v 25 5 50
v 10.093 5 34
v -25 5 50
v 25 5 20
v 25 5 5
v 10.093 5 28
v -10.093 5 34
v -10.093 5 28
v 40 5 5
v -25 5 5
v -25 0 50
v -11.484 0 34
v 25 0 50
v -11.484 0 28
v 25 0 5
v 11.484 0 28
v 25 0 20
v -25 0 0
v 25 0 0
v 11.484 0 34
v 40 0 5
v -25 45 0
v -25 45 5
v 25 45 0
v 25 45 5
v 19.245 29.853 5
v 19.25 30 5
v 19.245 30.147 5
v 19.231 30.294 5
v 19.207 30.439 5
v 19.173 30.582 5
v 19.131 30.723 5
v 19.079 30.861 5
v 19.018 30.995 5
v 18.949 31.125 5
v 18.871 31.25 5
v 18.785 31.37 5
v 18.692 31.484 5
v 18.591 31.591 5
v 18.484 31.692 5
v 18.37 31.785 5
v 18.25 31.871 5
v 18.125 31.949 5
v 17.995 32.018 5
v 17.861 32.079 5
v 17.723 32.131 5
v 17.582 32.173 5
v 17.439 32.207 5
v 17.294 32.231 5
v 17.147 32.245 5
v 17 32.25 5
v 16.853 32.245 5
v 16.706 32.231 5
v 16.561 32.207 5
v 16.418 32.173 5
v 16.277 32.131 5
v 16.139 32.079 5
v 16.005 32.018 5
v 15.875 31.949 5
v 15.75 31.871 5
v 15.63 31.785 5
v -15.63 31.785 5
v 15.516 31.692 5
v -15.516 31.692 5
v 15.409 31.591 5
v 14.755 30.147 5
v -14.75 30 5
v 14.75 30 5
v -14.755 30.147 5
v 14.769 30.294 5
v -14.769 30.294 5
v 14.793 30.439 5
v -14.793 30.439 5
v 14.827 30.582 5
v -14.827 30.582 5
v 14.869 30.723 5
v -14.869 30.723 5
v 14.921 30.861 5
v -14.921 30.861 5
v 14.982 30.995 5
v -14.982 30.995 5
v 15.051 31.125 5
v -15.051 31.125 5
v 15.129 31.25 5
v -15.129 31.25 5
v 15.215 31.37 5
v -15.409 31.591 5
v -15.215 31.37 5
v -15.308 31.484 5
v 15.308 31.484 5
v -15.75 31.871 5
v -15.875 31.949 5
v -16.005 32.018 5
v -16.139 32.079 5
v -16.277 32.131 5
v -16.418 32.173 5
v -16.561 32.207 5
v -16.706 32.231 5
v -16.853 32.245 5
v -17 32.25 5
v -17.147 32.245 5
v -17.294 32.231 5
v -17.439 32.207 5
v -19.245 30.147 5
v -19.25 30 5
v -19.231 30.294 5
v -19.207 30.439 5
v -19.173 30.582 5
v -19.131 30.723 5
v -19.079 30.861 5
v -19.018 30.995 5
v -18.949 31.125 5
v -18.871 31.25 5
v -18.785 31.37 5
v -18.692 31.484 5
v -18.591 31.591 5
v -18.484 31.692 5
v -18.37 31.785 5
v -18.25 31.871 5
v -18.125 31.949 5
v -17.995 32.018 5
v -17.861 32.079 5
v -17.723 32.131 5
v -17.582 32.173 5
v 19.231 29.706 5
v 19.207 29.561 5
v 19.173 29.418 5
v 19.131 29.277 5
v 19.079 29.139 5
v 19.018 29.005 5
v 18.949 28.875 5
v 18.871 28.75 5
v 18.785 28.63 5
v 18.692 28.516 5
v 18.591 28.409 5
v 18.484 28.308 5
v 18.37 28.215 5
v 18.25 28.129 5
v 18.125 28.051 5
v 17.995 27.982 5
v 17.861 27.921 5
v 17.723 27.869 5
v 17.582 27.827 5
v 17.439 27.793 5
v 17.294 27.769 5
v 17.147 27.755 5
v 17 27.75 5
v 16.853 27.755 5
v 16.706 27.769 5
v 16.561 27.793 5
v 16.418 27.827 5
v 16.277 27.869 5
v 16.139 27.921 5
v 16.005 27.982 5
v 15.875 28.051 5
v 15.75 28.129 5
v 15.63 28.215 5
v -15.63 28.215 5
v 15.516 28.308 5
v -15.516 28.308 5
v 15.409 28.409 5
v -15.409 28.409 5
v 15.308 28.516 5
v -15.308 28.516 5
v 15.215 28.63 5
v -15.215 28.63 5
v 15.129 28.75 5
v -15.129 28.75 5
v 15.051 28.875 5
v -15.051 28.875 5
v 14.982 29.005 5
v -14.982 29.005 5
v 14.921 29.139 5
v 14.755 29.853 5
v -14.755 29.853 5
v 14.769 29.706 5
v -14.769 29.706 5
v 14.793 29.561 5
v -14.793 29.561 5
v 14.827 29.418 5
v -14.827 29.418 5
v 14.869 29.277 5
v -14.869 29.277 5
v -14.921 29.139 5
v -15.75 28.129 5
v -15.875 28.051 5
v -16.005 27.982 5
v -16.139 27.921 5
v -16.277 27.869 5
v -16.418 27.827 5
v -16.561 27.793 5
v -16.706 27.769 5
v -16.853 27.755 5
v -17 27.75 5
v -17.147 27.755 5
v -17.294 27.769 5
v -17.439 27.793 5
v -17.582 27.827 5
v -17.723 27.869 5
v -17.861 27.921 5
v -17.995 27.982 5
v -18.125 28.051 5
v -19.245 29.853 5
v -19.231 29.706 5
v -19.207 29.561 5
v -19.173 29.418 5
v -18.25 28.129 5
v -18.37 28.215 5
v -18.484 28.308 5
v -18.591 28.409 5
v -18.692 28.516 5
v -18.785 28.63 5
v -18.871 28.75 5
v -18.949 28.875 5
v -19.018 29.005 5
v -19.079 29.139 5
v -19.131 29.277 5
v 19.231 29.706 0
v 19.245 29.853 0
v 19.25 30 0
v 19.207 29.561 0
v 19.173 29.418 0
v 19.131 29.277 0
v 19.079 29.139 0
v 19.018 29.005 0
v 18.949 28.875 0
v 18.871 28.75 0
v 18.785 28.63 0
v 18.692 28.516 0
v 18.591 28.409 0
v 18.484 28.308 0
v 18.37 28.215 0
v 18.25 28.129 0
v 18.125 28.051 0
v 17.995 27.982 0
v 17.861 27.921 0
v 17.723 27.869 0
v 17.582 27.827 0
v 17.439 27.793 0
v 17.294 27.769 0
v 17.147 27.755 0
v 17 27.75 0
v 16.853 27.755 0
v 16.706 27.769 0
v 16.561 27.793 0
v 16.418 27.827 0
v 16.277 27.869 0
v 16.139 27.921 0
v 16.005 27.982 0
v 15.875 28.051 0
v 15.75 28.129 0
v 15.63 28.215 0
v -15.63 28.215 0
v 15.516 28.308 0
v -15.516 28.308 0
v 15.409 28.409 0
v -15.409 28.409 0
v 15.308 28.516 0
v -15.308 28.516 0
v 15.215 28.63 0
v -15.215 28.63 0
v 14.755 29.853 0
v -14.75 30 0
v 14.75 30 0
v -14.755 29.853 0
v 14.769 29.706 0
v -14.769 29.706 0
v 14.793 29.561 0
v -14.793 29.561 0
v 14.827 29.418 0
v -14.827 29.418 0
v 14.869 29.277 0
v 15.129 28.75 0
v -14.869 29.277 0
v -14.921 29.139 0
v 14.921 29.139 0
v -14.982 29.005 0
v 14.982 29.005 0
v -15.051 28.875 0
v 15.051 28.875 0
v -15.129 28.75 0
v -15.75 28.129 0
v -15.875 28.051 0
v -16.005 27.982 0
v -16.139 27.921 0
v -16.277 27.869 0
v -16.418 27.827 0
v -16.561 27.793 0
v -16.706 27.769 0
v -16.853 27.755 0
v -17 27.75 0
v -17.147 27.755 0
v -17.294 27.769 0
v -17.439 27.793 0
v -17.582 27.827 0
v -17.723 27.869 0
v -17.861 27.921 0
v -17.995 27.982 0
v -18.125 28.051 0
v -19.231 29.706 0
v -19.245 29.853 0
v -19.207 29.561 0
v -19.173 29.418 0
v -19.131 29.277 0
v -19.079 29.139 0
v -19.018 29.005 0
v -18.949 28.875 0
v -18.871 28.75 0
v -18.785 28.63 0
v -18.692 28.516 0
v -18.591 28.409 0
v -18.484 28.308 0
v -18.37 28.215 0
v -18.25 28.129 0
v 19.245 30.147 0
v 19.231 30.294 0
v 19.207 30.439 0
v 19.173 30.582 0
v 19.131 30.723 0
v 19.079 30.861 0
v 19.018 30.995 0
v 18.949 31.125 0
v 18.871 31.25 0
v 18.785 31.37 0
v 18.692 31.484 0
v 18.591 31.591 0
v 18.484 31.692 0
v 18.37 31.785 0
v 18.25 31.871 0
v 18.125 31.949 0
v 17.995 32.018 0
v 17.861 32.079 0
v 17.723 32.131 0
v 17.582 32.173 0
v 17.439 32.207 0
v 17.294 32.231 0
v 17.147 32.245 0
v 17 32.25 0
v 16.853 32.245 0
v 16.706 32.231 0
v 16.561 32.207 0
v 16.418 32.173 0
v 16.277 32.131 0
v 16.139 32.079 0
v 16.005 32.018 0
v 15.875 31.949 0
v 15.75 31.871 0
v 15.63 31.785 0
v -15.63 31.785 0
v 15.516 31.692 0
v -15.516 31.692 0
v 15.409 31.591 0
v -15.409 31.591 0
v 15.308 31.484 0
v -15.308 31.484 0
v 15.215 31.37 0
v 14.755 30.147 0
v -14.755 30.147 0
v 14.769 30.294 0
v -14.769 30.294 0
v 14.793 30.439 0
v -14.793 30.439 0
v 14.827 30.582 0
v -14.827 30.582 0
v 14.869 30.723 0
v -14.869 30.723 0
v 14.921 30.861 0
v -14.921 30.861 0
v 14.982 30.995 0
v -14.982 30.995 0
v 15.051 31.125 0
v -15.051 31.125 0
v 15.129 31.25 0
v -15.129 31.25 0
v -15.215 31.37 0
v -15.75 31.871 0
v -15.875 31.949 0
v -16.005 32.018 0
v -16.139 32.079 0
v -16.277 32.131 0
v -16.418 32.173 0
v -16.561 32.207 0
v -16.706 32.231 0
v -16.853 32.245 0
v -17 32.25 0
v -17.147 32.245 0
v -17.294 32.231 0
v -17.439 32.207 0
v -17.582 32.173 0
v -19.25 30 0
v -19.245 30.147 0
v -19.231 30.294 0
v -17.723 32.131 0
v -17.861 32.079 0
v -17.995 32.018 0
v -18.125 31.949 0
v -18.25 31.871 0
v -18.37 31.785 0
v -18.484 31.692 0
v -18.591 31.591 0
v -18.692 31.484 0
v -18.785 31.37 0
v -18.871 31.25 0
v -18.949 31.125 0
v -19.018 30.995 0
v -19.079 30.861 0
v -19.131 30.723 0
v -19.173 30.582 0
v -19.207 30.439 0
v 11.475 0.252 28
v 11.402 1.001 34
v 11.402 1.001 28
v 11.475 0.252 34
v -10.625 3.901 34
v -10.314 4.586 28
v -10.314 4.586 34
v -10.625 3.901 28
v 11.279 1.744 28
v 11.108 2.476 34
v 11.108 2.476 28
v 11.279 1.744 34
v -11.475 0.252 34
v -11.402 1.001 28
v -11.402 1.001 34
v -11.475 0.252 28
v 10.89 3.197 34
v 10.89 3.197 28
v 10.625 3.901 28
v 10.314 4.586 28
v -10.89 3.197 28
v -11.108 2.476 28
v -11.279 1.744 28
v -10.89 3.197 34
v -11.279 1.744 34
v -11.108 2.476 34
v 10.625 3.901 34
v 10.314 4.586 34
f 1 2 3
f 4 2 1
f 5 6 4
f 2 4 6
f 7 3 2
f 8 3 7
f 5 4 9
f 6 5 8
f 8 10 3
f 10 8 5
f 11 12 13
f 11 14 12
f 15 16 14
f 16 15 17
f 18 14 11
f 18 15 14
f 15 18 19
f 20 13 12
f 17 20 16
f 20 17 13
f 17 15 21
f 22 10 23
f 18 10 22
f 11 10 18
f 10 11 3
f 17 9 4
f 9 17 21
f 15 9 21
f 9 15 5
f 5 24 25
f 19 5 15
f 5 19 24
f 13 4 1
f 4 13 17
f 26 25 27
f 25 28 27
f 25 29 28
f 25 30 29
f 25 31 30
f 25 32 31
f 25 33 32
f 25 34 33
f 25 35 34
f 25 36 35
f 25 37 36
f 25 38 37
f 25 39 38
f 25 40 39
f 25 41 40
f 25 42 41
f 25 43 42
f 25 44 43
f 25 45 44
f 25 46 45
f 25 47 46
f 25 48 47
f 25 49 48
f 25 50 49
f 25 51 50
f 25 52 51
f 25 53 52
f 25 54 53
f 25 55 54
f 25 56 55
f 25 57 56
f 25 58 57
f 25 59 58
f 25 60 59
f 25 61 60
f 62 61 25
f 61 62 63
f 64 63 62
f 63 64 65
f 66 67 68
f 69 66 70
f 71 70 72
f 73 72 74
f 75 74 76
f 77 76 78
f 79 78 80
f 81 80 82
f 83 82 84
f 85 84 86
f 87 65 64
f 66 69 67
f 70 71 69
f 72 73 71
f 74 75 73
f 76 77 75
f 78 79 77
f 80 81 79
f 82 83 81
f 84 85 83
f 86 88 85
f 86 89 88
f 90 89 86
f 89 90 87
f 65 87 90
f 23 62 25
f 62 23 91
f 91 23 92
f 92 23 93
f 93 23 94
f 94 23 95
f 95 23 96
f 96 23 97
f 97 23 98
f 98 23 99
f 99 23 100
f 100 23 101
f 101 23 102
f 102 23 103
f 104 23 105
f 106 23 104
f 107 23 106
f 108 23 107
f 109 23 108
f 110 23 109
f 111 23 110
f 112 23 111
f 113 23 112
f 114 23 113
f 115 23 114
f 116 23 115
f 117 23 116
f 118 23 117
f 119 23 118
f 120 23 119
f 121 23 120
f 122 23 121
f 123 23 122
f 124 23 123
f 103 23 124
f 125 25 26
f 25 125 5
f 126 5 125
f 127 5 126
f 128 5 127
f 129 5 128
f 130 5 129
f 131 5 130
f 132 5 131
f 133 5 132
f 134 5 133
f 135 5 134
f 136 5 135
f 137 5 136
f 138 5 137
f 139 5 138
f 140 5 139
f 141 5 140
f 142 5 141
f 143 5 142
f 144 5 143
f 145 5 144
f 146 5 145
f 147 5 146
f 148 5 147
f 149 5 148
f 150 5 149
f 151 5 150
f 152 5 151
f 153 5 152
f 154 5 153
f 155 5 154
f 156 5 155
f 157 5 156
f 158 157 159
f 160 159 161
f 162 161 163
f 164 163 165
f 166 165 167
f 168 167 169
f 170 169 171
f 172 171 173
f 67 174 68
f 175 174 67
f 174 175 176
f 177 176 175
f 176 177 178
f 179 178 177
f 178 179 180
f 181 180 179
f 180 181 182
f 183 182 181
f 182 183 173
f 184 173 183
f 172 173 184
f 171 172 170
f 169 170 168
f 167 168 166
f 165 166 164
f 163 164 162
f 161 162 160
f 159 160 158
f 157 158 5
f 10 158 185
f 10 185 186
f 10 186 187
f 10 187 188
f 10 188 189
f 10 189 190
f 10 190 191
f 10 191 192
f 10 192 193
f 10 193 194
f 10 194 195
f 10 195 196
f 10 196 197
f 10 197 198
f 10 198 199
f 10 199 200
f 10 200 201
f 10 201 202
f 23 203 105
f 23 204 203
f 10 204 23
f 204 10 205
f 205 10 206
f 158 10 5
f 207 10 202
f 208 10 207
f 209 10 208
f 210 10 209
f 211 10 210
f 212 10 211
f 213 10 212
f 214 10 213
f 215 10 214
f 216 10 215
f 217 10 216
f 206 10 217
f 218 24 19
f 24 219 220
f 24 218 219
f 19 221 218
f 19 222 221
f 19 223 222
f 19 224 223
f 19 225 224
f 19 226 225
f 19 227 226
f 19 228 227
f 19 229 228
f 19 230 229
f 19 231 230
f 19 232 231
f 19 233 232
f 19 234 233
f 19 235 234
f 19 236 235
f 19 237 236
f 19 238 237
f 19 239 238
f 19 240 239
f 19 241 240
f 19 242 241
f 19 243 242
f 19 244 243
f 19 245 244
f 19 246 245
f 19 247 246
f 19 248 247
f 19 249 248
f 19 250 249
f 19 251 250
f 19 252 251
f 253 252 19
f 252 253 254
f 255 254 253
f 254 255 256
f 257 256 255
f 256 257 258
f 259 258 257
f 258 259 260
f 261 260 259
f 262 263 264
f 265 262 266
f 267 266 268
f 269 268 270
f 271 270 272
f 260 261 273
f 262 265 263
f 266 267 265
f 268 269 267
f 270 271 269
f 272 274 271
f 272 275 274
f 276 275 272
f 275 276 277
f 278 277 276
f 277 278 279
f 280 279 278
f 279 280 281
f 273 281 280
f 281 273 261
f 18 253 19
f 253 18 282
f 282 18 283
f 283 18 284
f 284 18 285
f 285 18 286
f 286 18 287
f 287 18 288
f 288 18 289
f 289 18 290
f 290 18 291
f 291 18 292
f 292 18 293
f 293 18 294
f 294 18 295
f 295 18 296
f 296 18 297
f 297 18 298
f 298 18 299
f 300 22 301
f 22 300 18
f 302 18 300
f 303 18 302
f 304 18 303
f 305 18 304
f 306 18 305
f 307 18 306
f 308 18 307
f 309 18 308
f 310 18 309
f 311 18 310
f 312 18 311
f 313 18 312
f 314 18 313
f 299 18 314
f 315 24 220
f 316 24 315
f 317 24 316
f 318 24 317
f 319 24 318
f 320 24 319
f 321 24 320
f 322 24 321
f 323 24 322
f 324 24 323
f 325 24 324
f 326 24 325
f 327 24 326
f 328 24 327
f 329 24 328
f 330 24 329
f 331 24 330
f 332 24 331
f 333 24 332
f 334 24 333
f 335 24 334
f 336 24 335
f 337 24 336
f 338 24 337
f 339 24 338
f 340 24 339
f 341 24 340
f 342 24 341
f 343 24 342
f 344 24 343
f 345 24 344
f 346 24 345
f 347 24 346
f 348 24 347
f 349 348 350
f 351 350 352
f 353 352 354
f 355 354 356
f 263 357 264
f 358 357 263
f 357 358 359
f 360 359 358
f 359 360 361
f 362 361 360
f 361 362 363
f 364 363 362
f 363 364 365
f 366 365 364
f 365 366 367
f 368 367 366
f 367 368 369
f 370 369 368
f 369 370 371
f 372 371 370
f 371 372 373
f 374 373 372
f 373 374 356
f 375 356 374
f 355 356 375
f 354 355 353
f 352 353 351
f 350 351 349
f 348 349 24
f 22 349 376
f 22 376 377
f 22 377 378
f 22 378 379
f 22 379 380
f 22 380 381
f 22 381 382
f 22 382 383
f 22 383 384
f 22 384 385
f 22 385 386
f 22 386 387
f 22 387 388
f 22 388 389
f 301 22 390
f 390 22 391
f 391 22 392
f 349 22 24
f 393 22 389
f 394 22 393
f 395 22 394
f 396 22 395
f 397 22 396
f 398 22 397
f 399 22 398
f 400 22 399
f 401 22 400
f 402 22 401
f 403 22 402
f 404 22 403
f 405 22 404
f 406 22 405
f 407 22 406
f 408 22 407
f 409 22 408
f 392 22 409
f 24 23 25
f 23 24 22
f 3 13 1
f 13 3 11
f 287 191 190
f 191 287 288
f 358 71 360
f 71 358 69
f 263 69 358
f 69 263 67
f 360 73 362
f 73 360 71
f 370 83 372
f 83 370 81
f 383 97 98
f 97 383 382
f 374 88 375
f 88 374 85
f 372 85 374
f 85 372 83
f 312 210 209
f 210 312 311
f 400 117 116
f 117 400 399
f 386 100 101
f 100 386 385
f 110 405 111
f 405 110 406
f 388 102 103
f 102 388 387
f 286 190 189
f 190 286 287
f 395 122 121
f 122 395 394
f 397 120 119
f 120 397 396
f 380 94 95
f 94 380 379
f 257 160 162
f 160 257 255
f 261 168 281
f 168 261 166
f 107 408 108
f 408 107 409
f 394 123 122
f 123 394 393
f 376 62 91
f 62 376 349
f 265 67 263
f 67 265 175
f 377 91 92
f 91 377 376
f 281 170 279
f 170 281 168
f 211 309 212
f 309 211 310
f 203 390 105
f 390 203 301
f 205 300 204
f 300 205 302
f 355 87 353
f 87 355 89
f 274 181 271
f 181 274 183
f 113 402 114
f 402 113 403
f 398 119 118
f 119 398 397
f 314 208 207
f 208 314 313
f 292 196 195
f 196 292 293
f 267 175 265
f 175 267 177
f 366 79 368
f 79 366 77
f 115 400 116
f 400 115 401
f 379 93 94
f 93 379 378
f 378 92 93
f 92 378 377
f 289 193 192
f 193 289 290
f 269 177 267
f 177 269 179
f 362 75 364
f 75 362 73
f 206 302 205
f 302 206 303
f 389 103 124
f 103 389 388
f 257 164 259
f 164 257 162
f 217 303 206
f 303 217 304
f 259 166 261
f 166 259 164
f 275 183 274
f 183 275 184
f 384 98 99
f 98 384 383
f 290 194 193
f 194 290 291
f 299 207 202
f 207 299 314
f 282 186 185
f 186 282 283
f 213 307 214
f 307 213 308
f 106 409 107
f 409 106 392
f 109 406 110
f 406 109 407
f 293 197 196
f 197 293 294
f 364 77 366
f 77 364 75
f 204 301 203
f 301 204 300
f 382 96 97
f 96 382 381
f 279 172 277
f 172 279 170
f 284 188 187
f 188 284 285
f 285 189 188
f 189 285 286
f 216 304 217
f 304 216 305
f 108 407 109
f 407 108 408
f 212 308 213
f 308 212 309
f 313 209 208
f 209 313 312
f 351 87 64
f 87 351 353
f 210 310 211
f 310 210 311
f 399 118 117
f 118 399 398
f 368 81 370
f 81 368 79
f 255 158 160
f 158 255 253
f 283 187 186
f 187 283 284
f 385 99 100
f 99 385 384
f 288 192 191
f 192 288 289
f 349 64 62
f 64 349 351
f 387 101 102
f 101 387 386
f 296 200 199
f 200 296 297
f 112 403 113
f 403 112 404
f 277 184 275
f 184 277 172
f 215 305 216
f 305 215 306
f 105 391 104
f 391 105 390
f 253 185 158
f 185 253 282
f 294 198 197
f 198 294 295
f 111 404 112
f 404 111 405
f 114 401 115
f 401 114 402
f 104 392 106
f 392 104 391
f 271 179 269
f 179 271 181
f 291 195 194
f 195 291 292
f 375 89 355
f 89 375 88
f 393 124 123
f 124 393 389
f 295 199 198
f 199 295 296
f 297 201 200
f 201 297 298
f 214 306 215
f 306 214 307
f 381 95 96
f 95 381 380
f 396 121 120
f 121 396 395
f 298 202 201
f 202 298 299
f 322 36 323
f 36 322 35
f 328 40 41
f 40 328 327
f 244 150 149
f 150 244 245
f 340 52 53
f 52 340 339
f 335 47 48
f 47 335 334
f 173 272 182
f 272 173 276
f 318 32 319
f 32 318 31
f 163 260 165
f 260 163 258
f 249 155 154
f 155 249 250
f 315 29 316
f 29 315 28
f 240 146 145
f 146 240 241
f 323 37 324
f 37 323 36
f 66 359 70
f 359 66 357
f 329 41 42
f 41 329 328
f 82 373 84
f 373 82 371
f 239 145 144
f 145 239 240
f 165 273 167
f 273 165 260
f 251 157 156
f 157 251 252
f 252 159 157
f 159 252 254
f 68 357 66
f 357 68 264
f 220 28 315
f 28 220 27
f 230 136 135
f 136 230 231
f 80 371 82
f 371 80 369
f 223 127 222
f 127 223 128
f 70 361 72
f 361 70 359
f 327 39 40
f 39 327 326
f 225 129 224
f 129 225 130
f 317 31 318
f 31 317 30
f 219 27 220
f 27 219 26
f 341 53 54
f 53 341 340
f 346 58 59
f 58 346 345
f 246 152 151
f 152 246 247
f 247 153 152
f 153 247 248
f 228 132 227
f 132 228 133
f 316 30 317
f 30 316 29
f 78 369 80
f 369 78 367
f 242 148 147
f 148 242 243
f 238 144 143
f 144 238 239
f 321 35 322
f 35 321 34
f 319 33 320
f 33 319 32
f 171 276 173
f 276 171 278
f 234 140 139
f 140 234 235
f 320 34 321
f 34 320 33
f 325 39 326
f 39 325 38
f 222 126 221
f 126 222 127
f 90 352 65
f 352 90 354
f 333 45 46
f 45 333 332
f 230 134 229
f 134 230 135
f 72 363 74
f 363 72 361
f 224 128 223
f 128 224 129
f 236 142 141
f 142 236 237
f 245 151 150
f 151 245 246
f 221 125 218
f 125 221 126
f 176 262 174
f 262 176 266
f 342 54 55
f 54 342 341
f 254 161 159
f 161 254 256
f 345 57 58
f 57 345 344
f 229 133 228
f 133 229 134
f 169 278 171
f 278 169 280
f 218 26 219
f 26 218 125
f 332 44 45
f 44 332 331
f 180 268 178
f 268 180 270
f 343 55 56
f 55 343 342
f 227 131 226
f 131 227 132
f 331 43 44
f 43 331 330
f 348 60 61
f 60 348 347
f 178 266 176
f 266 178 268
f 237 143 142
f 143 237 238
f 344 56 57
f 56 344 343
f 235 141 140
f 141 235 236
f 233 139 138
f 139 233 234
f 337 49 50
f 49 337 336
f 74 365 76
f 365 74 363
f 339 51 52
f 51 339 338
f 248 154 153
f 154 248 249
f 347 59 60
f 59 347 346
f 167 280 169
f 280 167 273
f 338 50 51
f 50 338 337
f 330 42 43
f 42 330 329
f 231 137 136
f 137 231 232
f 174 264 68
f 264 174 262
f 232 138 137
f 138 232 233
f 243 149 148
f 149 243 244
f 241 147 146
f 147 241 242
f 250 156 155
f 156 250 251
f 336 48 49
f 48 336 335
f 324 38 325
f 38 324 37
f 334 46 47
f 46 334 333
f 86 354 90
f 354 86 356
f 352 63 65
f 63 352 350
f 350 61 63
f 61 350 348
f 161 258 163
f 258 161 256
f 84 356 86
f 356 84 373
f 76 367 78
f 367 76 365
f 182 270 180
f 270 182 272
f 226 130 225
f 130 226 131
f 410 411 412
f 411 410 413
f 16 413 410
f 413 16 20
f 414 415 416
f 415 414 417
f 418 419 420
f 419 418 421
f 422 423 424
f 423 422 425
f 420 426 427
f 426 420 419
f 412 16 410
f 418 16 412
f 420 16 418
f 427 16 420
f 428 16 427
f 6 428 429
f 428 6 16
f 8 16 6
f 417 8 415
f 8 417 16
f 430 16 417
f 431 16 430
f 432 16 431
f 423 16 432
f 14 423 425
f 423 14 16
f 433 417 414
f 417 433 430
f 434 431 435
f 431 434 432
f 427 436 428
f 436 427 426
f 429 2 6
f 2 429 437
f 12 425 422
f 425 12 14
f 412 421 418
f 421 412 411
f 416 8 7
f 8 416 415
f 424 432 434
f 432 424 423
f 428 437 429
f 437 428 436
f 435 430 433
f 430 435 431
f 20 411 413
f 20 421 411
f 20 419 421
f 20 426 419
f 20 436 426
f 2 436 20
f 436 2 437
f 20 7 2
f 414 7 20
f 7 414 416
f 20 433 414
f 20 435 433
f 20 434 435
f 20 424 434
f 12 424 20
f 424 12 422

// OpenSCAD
// L-shaped mounting bracket for NEMA 17 stepper motor
// Print orientation: base plate on bed, motor plate builds upward (+Z)

// ---------------- Parameters ----------------
plate_x      = 25;    // base plate half-width in X (mm)
plate_y      = 45;    // base plate length in Y (mm)
plate_t      = 5;     // base plate thickness in Z (mm)

hole_m4_x    = 17;    // M4 through-hole offset from centre in X (mm)
hole_m4_y    = 30;    // M4 through-hole Y position (mm)
hole_m4_d    = 4.5;   // M4 through-hole diameter (mm)

motor_hole_d = 23;    // motor centring boss hole diameter (mm)
motor_hole_x = 0;     // motor hole centre X (mm)
motor_hole_z = 28;    // motor hole centre Z (mm)

screw_d      = 3.4;   // M3 screw hole diameter (mm)
screw_pitch  = 31;    // square pattern pitch for screw holes (mm)

gusset_t     = 5;     // gusset thickness in X (mm)
gusset_leg   = 20;    // gusset leg length along +Y and +Z (mm)

eps          = 0.5;   // cutter overshoot past faces (mm)
$fn          = 96;    // curve resolution

// ---------------- Model ----------------
difference() {
    union() {
        // Base plate
        translate([-plate_x, 0, 0])
            cube([plate_x * 2, plate_y, plate_t]);

        // Vertical motor plate
        translate([-plate_x, 0, 0])
            cube([plate_x * 2, 5, 50]);

        // Gussets: right triangles in YZ, flush with left/right edges
        for (sx = [-1, 1])
            translate([sx > 0 ? plate_x - gusset_t : -plate_x, 5, 5])
                rotate([90, 0, 0])
                    linear_extrude(height = gusset_t)
                        polygon(points = [
                            [0, 0],
                            [gusset_leg, 0],
                            [0, gusset_leg]
                        ]);
    }

    // Base plate through-holes
    for (x = [-hole_m4_x, hole_m4_x])
        translate([x, hole_m4_y, -eps])
            cylinder(d = hole_m4_d, h = plate_t + 2 * eps);

    // Motor boss hole through motor plate (along Y)
    translate([motor_hole_x, -eps, motor_hole_z])
        cylinder(d = motor_hole_d, h = plate_t + 2 * eps);

    // M3 screw holes on square pattern centred on boss hole
    for (a = [0, 90, 180, 270])
        rotate([0, 0, a])
            translate([screw_pitch / 2, screw_pitch / 2, 0])
                translate([motor_hole_x, 0, motor_hole_z])
                    cylinder(d = screw_d, h = plate_t + 2 * eps);
}
